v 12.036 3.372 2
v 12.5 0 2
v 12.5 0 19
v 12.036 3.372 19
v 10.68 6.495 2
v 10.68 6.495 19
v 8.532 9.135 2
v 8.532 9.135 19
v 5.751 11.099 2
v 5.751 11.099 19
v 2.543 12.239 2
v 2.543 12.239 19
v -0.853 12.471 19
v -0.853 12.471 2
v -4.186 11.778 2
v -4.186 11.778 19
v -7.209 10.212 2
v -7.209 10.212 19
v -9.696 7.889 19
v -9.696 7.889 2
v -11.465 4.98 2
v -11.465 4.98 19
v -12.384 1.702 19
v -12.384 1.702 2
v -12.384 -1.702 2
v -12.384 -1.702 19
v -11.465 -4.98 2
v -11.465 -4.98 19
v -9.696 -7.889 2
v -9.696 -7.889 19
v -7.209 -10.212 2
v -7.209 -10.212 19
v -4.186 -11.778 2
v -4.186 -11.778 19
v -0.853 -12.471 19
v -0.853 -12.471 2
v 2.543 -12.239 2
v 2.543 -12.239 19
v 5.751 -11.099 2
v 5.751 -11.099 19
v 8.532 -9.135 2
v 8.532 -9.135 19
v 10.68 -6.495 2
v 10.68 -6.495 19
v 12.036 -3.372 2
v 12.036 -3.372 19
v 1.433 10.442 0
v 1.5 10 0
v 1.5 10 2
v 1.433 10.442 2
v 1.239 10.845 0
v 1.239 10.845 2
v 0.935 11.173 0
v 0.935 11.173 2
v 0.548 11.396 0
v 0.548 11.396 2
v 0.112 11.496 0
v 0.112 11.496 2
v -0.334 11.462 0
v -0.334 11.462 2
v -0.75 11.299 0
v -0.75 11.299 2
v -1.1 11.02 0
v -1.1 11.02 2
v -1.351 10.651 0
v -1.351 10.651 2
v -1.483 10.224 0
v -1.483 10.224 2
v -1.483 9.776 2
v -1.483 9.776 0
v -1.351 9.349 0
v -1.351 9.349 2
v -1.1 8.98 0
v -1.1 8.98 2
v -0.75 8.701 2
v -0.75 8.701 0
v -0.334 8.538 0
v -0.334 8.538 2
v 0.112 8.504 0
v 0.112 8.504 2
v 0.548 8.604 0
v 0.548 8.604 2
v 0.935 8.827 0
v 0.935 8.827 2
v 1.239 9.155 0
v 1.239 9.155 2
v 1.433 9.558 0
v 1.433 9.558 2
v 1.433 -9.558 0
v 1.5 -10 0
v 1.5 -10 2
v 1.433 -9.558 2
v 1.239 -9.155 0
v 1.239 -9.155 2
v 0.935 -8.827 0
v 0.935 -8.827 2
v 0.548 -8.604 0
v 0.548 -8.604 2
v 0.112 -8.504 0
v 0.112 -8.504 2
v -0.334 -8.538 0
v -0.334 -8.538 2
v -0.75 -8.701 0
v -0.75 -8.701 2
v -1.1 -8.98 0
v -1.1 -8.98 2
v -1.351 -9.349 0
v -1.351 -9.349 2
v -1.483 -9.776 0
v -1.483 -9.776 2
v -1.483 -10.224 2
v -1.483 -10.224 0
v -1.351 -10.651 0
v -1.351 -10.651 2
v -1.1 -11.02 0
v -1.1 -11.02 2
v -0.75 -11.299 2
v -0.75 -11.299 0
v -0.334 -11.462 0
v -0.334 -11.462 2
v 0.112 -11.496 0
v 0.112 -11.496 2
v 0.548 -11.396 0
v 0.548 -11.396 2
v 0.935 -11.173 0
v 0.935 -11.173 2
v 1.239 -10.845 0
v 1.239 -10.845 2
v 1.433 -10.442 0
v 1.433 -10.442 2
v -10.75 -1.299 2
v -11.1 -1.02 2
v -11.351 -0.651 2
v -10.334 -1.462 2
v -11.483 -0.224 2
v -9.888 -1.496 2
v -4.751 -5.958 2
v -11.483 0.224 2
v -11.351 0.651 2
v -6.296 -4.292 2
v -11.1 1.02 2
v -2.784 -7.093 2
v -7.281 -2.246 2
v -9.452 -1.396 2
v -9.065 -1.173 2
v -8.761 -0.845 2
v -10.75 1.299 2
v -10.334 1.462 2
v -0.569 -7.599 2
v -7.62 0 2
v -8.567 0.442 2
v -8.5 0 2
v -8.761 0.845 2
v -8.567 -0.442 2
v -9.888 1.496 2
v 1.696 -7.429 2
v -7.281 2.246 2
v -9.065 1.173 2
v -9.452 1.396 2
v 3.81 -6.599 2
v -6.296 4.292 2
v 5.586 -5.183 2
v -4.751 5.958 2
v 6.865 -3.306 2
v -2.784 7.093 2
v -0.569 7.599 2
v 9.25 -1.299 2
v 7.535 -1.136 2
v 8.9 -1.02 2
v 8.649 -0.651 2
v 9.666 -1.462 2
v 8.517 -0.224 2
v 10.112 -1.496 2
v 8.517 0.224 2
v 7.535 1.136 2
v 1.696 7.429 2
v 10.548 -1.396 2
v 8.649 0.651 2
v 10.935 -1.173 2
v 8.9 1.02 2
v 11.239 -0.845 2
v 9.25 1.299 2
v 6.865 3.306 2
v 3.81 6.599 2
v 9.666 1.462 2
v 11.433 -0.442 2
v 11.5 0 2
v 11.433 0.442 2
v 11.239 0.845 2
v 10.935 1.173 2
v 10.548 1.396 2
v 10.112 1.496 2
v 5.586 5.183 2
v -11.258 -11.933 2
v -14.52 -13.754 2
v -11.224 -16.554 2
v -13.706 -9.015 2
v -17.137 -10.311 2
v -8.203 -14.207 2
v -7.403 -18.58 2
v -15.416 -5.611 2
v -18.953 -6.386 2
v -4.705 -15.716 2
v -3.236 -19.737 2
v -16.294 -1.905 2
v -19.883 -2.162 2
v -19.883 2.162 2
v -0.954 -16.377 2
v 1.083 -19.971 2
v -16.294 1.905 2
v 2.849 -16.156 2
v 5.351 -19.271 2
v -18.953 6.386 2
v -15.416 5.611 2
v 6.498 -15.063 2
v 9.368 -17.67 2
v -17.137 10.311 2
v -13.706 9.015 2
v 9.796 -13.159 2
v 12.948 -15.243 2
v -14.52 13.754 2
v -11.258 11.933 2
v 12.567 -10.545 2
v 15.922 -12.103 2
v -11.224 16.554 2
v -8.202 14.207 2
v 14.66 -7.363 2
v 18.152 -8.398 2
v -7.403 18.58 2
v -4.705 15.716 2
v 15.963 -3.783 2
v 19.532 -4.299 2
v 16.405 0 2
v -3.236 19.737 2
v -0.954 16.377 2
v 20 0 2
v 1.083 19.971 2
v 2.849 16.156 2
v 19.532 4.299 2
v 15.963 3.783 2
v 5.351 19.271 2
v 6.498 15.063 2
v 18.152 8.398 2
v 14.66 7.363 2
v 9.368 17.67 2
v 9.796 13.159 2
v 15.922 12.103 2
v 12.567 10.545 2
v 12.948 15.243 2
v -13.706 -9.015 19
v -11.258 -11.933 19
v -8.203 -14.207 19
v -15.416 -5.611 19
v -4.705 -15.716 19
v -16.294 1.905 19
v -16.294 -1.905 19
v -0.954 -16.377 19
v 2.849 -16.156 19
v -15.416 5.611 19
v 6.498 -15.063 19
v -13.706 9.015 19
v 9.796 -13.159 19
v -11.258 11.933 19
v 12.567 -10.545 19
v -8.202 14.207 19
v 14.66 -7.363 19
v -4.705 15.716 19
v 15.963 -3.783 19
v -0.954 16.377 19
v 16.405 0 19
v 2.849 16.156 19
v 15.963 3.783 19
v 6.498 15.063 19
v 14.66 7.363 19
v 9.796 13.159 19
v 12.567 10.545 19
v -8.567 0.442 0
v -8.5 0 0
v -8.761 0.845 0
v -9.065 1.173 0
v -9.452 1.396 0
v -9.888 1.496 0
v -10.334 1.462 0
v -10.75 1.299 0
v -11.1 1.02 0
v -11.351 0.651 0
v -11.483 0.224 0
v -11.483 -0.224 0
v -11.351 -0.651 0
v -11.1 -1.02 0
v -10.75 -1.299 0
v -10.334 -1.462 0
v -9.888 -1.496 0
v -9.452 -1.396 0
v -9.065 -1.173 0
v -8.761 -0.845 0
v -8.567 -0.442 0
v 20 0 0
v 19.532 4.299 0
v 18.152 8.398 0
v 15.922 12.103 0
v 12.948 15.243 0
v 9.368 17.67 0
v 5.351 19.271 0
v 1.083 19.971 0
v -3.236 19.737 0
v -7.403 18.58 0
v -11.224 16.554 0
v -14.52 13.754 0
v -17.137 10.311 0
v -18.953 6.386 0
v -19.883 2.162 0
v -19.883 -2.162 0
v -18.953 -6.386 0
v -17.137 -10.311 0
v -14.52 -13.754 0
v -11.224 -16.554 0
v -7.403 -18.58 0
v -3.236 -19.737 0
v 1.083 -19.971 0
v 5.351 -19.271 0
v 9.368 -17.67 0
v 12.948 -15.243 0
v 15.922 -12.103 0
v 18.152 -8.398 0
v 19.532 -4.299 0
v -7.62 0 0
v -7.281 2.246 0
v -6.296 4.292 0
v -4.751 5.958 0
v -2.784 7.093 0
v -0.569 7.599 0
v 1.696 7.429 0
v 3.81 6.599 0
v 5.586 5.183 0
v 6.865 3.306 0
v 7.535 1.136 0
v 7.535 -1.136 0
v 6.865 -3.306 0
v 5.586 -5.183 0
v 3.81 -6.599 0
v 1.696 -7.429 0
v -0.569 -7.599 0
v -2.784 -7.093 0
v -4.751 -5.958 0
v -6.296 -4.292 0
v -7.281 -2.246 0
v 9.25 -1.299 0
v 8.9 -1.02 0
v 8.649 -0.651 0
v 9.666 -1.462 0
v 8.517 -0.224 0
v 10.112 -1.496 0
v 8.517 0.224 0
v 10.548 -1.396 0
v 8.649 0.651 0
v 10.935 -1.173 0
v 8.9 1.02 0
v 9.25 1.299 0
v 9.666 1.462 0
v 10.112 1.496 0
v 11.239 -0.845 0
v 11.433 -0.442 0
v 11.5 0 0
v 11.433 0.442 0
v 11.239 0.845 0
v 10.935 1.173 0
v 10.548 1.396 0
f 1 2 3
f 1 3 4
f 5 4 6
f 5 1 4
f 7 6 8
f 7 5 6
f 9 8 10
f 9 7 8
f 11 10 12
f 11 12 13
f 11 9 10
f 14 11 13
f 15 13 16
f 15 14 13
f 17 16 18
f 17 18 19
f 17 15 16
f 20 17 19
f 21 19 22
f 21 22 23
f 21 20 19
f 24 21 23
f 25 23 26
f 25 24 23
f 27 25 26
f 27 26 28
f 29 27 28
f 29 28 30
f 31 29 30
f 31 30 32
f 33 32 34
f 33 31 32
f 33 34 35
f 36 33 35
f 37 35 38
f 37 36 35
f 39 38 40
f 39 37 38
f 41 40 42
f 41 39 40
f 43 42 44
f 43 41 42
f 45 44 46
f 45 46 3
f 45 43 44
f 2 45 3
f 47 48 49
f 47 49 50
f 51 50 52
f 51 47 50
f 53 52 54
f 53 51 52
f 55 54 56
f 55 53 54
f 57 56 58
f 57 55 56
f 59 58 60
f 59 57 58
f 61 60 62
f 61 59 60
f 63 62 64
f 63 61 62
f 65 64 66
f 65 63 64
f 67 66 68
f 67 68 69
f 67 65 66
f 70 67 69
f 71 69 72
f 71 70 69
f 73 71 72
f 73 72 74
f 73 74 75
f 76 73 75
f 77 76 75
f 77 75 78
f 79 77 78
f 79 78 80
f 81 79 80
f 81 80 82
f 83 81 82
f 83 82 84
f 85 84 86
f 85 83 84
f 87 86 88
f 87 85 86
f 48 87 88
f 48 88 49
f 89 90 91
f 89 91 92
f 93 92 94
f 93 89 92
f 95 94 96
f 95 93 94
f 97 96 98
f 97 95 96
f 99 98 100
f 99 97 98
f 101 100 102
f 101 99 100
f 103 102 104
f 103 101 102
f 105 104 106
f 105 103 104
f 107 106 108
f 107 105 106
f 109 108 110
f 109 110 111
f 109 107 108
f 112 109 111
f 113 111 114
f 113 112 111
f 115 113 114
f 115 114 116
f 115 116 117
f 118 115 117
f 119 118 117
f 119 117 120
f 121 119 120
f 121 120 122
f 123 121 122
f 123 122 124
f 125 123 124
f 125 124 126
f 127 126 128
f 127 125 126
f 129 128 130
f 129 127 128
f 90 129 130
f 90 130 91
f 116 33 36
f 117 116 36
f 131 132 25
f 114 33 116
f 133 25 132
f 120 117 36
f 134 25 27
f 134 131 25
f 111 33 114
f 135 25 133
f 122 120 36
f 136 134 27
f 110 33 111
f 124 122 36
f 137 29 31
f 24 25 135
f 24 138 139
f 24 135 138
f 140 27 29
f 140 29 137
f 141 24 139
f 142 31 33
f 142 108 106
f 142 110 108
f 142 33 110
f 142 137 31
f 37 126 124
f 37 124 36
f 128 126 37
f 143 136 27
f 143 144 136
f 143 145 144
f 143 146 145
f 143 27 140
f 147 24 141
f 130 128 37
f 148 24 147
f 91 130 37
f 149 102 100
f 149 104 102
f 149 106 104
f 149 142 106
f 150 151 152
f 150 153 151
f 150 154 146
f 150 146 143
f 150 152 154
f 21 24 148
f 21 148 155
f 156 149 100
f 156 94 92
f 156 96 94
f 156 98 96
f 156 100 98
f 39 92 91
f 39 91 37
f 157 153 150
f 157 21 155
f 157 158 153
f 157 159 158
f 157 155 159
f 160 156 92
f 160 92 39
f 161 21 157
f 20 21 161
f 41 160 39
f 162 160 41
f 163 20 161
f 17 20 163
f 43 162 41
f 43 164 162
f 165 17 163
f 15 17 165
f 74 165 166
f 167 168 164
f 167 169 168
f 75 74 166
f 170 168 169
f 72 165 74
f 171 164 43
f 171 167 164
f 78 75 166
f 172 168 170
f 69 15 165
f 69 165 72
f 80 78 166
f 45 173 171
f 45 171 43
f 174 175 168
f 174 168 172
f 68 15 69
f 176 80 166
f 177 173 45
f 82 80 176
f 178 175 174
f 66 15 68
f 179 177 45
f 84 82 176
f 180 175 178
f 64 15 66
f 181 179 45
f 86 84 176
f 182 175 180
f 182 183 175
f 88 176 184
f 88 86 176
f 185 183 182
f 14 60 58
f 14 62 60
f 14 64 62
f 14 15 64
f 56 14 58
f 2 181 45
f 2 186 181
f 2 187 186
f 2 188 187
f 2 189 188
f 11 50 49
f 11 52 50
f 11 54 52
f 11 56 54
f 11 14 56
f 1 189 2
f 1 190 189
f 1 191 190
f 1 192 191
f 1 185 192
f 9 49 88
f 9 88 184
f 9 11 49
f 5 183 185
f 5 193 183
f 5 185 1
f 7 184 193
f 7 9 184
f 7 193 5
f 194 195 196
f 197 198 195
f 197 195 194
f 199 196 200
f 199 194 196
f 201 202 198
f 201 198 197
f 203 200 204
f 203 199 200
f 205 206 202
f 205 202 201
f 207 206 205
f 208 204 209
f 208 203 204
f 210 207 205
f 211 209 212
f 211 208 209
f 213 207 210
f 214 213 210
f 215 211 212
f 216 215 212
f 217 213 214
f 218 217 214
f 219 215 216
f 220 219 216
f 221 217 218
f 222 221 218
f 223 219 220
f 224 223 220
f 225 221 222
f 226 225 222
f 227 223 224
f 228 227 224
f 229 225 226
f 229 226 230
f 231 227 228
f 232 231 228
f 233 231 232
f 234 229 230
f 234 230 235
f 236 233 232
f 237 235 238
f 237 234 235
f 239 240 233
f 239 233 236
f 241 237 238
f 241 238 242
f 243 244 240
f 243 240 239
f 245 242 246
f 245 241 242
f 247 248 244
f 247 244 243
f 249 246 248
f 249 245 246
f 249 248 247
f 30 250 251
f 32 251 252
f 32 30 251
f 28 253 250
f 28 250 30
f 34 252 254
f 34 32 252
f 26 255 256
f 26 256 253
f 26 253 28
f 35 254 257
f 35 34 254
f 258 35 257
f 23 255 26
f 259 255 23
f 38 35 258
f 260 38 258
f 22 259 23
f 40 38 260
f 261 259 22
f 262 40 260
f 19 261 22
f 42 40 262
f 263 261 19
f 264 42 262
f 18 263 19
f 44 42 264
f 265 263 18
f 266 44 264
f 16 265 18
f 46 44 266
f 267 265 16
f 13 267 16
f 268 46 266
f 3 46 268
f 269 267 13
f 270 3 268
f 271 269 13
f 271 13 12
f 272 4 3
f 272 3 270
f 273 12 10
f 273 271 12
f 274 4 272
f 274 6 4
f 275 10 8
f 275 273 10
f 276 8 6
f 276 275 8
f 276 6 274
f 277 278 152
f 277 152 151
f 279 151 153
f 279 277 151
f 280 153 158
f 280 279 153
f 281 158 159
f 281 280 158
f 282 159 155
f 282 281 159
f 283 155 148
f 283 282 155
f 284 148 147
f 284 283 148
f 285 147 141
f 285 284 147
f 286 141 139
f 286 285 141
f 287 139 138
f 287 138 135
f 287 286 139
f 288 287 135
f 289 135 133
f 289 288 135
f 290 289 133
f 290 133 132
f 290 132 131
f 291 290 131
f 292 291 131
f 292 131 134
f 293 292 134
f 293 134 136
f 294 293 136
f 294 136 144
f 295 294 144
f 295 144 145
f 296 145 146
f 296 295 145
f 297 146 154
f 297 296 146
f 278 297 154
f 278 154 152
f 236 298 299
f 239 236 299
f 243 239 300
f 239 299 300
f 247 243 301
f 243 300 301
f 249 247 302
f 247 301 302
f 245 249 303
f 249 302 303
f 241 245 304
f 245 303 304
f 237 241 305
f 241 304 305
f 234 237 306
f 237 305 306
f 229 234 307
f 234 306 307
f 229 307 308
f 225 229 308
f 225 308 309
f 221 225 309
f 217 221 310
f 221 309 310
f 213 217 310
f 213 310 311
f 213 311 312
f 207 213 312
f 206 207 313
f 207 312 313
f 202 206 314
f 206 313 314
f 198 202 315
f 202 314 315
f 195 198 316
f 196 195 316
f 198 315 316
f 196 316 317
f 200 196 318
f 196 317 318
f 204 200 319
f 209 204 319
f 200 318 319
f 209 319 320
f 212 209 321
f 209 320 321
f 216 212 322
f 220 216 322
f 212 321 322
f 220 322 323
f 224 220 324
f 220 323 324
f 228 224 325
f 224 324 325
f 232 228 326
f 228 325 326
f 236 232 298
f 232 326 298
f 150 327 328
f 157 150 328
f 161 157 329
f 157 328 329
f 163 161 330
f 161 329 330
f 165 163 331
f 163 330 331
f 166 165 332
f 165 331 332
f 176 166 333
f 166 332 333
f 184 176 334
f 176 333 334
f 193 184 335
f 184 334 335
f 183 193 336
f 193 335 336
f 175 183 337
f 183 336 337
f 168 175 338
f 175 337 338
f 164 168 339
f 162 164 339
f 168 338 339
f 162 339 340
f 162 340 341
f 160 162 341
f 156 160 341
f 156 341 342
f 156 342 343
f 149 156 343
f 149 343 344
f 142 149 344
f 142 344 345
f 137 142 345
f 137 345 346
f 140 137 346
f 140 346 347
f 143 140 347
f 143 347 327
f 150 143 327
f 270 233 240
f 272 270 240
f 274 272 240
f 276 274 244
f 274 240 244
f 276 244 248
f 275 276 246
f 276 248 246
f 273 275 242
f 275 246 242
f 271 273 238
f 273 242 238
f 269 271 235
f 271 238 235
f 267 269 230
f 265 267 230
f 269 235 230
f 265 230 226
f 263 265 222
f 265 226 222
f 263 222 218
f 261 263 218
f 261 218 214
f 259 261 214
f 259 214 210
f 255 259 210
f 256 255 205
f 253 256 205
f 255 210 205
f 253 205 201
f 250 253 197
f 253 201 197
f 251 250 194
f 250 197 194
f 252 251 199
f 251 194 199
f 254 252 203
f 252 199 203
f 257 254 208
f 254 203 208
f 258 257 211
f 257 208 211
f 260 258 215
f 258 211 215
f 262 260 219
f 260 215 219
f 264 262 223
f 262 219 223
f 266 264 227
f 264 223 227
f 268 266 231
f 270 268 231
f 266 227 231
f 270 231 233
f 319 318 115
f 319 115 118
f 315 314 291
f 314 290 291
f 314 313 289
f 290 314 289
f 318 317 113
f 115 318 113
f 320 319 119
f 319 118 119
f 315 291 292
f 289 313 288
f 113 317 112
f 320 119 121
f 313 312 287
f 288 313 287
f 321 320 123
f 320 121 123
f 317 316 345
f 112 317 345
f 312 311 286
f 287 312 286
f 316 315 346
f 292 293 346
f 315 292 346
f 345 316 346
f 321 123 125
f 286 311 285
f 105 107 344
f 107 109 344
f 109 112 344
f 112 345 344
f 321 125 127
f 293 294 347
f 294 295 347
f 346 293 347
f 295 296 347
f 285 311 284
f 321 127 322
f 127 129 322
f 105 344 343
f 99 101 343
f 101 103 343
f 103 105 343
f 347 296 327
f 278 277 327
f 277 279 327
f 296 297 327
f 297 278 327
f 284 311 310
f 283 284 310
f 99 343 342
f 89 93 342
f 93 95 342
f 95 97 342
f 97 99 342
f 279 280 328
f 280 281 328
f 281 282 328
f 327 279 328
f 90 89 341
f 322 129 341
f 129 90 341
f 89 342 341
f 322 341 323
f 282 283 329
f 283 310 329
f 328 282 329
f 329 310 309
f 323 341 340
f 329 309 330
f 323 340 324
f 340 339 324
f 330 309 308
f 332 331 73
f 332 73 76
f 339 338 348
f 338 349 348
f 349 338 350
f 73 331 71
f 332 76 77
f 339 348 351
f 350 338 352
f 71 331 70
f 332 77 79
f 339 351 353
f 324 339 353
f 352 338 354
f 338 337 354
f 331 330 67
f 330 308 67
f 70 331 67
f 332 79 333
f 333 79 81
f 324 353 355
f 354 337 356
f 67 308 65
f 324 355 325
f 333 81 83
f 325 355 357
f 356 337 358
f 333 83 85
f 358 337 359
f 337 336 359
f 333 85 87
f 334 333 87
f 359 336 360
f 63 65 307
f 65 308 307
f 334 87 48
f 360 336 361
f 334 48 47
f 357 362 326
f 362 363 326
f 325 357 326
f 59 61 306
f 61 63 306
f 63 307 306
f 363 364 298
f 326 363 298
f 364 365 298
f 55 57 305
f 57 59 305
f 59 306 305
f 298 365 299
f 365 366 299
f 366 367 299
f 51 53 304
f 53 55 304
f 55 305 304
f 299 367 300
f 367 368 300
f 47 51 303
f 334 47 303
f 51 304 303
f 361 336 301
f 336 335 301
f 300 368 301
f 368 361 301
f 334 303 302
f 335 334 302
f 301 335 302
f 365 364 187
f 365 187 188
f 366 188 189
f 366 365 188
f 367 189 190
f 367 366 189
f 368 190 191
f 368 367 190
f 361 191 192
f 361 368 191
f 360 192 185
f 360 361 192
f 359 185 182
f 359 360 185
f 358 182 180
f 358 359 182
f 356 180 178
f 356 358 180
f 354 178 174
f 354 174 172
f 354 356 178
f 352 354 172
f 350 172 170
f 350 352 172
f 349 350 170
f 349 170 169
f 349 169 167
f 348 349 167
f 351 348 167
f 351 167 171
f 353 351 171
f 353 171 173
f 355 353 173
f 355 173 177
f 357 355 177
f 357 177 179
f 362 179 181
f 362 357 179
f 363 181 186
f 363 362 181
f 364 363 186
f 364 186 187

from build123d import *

# Parameters (mm, degrees)
SKETCH1_R           = 20
SKETCH1_R_2         = 1.5
BOSS_EXTRUDE1_DEPTH = 2
SKETCH2_R           = 16.405
SKETCH2_R_2         = 12.5
BOSS_EXTRUDE2_DEPTH = 17
SKETCH4_R           = 7.62
CUT_EXTRUDE1_DEPTH  = 17


with BuildPart() as part:
    # Sketch1 → Boss-Extrude1 (new body)
    with BuildSketch(Plane.XY):
        Circle(SKETCH1_R)
        with Locations((0, 10)):
            Circle(SKETCH1_R_2, mode=Mode.SUBTRACT)
        with Locations((10, 0)):
            Circle(SKETCH1_R_2, mode=Mode.SUBTRACT)
        with Locations((0, -10)):
            Circle(SKETCH1_R_2, mode=Mode.SUBTRACT)
        with Locations((-10, 0)):
            Circle(SKETCH1_R_2, mode=Mode.SUBTRACT)
    extrude(amount=BOSS_EXTRUDE1_DEPTH)

    # Sketch2 → Boss-Extrude2 (add)
    with BuildSketch(Plane.XY.offset(2)):
        Circle(SKETCH2_R)
        Circle(SKETCH2_R_2, mode=Mode.SUBTRACT)
    extrude(amount=BOSS_EXTRUDE2_DEPTH)

    # Sketch4 → Cut-Extrude1 (cut)
    with BuildSketch(Plane(origin=(0, 0, 0), x_dir=(-1, 0, 0), z_dir=(0, 0, -1))):
        Circle(SKETCH4_R)
    extrude(amount=-CUT_EXTRUDE1_DEPTH, mode=Mode.SUBTRACT)


solid = part.part
